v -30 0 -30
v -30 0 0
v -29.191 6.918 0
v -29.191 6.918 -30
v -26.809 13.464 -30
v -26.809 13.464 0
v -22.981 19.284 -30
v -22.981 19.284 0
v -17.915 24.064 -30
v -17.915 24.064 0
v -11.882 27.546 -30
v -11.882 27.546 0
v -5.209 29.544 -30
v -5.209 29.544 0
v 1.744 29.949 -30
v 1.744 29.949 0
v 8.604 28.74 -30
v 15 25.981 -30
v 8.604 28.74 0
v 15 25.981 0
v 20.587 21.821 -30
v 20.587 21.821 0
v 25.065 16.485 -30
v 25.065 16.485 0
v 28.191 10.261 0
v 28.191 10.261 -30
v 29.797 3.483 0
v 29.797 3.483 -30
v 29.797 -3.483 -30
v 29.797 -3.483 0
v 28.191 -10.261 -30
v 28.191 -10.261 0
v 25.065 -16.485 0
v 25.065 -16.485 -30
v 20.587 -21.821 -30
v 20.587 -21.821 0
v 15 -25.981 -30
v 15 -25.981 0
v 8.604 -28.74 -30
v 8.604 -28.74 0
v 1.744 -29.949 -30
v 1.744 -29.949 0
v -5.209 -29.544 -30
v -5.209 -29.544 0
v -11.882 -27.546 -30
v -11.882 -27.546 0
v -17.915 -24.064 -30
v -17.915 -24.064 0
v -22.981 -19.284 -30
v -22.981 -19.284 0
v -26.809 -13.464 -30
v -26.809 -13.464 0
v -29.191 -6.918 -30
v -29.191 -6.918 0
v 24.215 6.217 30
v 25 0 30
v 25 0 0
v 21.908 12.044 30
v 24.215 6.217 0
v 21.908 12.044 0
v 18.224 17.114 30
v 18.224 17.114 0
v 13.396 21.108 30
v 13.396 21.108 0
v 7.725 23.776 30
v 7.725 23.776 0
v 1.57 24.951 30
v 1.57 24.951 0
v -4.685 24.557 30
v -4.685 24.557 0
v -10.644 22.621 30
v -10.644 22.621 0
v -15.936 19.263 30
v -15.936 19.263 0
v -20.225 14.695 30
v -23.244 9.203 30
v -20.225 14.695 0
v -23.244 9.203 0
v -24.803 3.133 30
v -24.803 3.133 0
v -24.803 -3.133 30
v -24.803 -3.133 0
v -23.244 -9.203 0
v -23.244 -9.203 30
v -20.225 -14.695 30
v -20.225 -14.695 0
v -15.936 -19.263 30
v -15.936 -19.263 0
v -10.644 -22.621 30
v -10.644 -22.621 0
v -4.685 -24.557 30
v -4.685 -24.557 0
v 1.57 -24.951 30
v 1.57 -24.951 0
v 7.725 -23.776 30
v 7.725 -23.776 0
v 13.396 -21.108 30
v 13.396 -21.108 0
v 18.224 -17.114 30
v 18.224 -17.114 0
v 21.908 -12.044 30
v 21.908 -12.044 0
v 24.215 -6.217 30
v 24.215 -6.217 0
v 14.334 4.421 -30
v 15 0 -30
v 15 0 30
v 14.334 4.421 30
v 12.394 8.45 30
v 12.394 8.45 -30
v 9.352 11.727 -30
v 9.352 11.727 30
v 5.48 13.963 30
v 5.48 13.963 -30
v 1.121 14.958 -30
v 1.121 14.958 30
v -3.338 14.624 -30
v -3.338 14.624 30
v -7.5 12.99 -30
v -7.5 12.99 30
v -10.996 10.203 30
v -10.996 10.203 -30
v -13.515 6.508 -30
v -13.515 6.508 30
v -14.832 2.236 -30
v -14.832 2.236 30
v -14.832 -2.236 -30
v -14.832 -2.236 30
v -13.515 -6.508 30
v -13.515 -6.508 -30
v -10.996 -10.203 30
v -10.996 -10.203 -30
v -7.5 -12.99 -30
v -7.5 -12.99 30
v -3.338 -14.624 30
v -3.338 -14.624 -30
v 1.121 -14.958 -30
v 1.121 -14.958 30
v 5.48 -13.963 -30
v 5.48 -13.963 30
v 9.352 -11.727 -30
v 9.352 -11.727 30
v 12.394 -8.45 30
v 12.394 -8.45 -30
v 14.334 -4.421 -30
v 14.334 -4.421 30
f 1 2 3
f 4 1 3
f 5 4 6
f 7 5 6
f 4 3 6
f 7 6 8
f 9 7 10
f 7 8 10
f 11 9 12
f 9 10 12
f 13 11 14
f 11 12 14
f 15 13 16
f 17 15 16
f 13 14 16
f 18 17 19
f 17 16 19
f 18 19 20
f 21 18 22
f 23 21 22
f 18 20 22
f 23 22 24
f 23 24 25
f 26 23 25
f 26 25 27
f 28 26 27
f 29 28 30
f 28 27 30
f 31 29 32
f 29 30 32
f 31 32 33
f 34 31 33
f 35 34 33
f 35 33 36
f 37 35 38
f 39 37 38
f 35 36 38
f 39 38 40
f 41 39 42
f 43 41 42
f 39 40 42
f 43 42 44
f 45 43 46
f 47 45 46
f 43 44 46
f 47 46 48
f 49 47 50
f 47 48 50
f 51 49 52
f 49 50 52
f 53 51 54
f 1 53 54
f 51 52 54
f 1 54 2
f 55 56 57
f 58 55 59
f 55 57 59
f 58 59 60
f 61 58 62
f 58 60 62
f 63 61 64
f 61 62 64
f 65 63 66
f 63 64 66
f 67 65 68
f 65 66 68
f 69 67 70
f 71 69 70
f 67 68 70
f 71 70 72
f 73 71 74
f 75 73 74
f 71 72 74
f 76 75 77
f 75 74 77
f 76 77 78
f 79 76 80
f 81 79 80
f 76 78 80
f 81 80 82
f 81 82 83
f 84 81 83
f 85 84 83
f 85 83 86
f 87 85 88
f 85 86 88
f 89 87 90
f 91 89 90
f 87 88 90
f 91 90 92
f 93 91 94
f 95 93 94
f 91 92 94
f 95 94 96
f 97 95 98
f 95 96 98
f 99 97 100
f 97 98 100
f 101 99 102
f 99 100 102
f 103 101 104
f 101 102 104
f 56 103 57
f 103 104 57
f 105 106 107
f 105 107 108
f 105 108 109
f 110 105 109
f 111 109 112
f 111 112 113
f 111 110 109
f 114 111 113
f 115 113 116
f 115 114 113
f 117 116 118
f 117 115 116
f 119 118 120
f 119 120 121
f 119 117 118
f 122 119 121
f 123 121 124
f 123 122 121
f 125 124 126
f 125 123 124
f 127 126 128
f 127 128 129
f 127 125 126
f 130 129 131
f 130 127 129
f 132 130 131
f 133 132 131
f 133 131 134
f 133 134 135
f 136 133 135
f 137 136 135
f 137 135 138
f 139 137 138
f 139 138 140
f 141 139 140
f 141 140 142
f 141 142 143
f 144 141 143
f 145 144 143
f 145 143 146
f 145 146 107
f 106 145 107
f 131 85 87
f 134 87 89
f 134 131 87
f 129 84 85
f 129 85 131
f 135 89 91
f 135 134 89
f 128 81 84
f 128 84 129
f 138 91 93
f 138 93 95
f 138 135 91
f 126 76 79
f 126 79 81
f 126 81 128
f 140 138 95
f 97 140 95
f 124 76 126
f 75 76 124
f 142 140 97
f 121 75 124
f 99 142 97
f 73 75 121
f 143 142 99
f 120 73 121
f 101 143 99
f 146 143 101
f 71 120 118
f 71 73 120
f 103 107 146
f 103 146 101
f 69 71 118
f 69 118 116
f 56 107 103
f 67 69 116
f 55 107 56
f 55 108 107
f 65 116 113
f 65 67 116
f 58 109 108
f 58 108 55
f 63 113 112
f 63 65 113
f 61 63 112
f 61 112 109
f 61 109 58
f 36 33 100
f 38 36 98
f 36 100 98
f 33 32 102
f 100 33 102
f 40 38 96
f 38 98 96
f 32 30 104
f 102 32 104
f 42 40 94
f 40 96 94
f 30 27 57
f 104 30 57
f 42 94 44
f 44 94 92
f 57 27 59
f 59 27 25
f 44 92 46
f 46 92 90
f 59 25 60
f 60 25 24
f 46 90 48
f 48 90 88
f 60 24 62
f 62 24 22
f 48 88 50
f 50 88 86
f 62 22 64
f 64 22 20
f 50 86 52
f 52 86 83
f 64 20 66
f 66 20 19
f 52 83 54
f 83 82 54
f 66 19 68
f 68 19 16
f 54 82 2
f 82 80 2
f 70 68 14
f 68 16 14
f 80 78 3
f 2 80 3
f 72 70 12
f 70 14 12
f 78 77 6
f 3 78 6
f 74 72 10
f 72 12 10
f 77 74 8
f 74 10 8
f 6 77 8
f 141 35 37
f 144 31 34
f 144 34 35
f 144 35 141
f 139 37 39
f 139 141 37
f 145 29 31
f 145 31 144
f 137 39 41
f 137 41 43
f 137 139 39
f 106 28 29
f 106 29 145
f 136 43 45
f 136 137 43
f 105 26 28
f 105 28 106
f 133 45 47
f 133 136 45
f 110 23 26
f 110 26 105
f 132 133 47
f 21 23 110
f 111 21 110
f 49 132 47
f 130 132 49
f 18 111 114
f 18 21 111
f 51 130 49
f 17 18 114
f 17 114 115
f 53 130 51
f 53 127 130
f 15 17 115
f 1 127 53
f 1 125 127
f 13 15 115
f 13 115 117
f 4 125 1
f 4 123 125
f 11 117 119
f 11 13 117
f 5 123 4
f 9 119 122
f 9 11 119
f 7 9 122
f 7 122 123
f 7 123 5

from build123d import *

# Parameters (mm, degrees)
SKETCH1_R           = 25
SKETCH1_R_2         = 15
BOSS_EXTRUDE1_DEPTH = 30
SKETCH2_R           = 30
BOSS_EXTRUDE2_DEPTH = 30
CUT_EXTRUDE1_START  = -30
SKETCH3_R           = 15
CUT_EXTRUDE1_DEPTH  = 30


with BuildPart() as part:
    # Sketch1 → Boss-Extrude1 (new body)
    with BuildSketch(Plane.XY):
        Circle(SKETCH1_R)
        Circle(SKETCH1_R_2, mode=Mode.SUBTRACT)
    extrude(amount=BOSS_EXTRUDE1_DEPTH)

    # Sketch2 → Boss-Extrude2 (add)
    with BuildSketch(Plane(origin=(0, 0, 0), x_dir=(-1, 0, 0), z_dir=(0, 0, -1))):
        Circle(SKETCH2_R)
    extrude(amount=BOSS_EXTRUDE2_DEPTH)

    # Sketch3 → Cut-Extrude1 (cut)
    with BuildSketch(Plane.XY.offset(CUT_EXTRUDE1_START)):
        Circle(SKETCH3_R)
    extrude(amount=CUT_EXTRUDE1_DEPTH, mode=Mode.SUBTRACT)


solid = part.part
